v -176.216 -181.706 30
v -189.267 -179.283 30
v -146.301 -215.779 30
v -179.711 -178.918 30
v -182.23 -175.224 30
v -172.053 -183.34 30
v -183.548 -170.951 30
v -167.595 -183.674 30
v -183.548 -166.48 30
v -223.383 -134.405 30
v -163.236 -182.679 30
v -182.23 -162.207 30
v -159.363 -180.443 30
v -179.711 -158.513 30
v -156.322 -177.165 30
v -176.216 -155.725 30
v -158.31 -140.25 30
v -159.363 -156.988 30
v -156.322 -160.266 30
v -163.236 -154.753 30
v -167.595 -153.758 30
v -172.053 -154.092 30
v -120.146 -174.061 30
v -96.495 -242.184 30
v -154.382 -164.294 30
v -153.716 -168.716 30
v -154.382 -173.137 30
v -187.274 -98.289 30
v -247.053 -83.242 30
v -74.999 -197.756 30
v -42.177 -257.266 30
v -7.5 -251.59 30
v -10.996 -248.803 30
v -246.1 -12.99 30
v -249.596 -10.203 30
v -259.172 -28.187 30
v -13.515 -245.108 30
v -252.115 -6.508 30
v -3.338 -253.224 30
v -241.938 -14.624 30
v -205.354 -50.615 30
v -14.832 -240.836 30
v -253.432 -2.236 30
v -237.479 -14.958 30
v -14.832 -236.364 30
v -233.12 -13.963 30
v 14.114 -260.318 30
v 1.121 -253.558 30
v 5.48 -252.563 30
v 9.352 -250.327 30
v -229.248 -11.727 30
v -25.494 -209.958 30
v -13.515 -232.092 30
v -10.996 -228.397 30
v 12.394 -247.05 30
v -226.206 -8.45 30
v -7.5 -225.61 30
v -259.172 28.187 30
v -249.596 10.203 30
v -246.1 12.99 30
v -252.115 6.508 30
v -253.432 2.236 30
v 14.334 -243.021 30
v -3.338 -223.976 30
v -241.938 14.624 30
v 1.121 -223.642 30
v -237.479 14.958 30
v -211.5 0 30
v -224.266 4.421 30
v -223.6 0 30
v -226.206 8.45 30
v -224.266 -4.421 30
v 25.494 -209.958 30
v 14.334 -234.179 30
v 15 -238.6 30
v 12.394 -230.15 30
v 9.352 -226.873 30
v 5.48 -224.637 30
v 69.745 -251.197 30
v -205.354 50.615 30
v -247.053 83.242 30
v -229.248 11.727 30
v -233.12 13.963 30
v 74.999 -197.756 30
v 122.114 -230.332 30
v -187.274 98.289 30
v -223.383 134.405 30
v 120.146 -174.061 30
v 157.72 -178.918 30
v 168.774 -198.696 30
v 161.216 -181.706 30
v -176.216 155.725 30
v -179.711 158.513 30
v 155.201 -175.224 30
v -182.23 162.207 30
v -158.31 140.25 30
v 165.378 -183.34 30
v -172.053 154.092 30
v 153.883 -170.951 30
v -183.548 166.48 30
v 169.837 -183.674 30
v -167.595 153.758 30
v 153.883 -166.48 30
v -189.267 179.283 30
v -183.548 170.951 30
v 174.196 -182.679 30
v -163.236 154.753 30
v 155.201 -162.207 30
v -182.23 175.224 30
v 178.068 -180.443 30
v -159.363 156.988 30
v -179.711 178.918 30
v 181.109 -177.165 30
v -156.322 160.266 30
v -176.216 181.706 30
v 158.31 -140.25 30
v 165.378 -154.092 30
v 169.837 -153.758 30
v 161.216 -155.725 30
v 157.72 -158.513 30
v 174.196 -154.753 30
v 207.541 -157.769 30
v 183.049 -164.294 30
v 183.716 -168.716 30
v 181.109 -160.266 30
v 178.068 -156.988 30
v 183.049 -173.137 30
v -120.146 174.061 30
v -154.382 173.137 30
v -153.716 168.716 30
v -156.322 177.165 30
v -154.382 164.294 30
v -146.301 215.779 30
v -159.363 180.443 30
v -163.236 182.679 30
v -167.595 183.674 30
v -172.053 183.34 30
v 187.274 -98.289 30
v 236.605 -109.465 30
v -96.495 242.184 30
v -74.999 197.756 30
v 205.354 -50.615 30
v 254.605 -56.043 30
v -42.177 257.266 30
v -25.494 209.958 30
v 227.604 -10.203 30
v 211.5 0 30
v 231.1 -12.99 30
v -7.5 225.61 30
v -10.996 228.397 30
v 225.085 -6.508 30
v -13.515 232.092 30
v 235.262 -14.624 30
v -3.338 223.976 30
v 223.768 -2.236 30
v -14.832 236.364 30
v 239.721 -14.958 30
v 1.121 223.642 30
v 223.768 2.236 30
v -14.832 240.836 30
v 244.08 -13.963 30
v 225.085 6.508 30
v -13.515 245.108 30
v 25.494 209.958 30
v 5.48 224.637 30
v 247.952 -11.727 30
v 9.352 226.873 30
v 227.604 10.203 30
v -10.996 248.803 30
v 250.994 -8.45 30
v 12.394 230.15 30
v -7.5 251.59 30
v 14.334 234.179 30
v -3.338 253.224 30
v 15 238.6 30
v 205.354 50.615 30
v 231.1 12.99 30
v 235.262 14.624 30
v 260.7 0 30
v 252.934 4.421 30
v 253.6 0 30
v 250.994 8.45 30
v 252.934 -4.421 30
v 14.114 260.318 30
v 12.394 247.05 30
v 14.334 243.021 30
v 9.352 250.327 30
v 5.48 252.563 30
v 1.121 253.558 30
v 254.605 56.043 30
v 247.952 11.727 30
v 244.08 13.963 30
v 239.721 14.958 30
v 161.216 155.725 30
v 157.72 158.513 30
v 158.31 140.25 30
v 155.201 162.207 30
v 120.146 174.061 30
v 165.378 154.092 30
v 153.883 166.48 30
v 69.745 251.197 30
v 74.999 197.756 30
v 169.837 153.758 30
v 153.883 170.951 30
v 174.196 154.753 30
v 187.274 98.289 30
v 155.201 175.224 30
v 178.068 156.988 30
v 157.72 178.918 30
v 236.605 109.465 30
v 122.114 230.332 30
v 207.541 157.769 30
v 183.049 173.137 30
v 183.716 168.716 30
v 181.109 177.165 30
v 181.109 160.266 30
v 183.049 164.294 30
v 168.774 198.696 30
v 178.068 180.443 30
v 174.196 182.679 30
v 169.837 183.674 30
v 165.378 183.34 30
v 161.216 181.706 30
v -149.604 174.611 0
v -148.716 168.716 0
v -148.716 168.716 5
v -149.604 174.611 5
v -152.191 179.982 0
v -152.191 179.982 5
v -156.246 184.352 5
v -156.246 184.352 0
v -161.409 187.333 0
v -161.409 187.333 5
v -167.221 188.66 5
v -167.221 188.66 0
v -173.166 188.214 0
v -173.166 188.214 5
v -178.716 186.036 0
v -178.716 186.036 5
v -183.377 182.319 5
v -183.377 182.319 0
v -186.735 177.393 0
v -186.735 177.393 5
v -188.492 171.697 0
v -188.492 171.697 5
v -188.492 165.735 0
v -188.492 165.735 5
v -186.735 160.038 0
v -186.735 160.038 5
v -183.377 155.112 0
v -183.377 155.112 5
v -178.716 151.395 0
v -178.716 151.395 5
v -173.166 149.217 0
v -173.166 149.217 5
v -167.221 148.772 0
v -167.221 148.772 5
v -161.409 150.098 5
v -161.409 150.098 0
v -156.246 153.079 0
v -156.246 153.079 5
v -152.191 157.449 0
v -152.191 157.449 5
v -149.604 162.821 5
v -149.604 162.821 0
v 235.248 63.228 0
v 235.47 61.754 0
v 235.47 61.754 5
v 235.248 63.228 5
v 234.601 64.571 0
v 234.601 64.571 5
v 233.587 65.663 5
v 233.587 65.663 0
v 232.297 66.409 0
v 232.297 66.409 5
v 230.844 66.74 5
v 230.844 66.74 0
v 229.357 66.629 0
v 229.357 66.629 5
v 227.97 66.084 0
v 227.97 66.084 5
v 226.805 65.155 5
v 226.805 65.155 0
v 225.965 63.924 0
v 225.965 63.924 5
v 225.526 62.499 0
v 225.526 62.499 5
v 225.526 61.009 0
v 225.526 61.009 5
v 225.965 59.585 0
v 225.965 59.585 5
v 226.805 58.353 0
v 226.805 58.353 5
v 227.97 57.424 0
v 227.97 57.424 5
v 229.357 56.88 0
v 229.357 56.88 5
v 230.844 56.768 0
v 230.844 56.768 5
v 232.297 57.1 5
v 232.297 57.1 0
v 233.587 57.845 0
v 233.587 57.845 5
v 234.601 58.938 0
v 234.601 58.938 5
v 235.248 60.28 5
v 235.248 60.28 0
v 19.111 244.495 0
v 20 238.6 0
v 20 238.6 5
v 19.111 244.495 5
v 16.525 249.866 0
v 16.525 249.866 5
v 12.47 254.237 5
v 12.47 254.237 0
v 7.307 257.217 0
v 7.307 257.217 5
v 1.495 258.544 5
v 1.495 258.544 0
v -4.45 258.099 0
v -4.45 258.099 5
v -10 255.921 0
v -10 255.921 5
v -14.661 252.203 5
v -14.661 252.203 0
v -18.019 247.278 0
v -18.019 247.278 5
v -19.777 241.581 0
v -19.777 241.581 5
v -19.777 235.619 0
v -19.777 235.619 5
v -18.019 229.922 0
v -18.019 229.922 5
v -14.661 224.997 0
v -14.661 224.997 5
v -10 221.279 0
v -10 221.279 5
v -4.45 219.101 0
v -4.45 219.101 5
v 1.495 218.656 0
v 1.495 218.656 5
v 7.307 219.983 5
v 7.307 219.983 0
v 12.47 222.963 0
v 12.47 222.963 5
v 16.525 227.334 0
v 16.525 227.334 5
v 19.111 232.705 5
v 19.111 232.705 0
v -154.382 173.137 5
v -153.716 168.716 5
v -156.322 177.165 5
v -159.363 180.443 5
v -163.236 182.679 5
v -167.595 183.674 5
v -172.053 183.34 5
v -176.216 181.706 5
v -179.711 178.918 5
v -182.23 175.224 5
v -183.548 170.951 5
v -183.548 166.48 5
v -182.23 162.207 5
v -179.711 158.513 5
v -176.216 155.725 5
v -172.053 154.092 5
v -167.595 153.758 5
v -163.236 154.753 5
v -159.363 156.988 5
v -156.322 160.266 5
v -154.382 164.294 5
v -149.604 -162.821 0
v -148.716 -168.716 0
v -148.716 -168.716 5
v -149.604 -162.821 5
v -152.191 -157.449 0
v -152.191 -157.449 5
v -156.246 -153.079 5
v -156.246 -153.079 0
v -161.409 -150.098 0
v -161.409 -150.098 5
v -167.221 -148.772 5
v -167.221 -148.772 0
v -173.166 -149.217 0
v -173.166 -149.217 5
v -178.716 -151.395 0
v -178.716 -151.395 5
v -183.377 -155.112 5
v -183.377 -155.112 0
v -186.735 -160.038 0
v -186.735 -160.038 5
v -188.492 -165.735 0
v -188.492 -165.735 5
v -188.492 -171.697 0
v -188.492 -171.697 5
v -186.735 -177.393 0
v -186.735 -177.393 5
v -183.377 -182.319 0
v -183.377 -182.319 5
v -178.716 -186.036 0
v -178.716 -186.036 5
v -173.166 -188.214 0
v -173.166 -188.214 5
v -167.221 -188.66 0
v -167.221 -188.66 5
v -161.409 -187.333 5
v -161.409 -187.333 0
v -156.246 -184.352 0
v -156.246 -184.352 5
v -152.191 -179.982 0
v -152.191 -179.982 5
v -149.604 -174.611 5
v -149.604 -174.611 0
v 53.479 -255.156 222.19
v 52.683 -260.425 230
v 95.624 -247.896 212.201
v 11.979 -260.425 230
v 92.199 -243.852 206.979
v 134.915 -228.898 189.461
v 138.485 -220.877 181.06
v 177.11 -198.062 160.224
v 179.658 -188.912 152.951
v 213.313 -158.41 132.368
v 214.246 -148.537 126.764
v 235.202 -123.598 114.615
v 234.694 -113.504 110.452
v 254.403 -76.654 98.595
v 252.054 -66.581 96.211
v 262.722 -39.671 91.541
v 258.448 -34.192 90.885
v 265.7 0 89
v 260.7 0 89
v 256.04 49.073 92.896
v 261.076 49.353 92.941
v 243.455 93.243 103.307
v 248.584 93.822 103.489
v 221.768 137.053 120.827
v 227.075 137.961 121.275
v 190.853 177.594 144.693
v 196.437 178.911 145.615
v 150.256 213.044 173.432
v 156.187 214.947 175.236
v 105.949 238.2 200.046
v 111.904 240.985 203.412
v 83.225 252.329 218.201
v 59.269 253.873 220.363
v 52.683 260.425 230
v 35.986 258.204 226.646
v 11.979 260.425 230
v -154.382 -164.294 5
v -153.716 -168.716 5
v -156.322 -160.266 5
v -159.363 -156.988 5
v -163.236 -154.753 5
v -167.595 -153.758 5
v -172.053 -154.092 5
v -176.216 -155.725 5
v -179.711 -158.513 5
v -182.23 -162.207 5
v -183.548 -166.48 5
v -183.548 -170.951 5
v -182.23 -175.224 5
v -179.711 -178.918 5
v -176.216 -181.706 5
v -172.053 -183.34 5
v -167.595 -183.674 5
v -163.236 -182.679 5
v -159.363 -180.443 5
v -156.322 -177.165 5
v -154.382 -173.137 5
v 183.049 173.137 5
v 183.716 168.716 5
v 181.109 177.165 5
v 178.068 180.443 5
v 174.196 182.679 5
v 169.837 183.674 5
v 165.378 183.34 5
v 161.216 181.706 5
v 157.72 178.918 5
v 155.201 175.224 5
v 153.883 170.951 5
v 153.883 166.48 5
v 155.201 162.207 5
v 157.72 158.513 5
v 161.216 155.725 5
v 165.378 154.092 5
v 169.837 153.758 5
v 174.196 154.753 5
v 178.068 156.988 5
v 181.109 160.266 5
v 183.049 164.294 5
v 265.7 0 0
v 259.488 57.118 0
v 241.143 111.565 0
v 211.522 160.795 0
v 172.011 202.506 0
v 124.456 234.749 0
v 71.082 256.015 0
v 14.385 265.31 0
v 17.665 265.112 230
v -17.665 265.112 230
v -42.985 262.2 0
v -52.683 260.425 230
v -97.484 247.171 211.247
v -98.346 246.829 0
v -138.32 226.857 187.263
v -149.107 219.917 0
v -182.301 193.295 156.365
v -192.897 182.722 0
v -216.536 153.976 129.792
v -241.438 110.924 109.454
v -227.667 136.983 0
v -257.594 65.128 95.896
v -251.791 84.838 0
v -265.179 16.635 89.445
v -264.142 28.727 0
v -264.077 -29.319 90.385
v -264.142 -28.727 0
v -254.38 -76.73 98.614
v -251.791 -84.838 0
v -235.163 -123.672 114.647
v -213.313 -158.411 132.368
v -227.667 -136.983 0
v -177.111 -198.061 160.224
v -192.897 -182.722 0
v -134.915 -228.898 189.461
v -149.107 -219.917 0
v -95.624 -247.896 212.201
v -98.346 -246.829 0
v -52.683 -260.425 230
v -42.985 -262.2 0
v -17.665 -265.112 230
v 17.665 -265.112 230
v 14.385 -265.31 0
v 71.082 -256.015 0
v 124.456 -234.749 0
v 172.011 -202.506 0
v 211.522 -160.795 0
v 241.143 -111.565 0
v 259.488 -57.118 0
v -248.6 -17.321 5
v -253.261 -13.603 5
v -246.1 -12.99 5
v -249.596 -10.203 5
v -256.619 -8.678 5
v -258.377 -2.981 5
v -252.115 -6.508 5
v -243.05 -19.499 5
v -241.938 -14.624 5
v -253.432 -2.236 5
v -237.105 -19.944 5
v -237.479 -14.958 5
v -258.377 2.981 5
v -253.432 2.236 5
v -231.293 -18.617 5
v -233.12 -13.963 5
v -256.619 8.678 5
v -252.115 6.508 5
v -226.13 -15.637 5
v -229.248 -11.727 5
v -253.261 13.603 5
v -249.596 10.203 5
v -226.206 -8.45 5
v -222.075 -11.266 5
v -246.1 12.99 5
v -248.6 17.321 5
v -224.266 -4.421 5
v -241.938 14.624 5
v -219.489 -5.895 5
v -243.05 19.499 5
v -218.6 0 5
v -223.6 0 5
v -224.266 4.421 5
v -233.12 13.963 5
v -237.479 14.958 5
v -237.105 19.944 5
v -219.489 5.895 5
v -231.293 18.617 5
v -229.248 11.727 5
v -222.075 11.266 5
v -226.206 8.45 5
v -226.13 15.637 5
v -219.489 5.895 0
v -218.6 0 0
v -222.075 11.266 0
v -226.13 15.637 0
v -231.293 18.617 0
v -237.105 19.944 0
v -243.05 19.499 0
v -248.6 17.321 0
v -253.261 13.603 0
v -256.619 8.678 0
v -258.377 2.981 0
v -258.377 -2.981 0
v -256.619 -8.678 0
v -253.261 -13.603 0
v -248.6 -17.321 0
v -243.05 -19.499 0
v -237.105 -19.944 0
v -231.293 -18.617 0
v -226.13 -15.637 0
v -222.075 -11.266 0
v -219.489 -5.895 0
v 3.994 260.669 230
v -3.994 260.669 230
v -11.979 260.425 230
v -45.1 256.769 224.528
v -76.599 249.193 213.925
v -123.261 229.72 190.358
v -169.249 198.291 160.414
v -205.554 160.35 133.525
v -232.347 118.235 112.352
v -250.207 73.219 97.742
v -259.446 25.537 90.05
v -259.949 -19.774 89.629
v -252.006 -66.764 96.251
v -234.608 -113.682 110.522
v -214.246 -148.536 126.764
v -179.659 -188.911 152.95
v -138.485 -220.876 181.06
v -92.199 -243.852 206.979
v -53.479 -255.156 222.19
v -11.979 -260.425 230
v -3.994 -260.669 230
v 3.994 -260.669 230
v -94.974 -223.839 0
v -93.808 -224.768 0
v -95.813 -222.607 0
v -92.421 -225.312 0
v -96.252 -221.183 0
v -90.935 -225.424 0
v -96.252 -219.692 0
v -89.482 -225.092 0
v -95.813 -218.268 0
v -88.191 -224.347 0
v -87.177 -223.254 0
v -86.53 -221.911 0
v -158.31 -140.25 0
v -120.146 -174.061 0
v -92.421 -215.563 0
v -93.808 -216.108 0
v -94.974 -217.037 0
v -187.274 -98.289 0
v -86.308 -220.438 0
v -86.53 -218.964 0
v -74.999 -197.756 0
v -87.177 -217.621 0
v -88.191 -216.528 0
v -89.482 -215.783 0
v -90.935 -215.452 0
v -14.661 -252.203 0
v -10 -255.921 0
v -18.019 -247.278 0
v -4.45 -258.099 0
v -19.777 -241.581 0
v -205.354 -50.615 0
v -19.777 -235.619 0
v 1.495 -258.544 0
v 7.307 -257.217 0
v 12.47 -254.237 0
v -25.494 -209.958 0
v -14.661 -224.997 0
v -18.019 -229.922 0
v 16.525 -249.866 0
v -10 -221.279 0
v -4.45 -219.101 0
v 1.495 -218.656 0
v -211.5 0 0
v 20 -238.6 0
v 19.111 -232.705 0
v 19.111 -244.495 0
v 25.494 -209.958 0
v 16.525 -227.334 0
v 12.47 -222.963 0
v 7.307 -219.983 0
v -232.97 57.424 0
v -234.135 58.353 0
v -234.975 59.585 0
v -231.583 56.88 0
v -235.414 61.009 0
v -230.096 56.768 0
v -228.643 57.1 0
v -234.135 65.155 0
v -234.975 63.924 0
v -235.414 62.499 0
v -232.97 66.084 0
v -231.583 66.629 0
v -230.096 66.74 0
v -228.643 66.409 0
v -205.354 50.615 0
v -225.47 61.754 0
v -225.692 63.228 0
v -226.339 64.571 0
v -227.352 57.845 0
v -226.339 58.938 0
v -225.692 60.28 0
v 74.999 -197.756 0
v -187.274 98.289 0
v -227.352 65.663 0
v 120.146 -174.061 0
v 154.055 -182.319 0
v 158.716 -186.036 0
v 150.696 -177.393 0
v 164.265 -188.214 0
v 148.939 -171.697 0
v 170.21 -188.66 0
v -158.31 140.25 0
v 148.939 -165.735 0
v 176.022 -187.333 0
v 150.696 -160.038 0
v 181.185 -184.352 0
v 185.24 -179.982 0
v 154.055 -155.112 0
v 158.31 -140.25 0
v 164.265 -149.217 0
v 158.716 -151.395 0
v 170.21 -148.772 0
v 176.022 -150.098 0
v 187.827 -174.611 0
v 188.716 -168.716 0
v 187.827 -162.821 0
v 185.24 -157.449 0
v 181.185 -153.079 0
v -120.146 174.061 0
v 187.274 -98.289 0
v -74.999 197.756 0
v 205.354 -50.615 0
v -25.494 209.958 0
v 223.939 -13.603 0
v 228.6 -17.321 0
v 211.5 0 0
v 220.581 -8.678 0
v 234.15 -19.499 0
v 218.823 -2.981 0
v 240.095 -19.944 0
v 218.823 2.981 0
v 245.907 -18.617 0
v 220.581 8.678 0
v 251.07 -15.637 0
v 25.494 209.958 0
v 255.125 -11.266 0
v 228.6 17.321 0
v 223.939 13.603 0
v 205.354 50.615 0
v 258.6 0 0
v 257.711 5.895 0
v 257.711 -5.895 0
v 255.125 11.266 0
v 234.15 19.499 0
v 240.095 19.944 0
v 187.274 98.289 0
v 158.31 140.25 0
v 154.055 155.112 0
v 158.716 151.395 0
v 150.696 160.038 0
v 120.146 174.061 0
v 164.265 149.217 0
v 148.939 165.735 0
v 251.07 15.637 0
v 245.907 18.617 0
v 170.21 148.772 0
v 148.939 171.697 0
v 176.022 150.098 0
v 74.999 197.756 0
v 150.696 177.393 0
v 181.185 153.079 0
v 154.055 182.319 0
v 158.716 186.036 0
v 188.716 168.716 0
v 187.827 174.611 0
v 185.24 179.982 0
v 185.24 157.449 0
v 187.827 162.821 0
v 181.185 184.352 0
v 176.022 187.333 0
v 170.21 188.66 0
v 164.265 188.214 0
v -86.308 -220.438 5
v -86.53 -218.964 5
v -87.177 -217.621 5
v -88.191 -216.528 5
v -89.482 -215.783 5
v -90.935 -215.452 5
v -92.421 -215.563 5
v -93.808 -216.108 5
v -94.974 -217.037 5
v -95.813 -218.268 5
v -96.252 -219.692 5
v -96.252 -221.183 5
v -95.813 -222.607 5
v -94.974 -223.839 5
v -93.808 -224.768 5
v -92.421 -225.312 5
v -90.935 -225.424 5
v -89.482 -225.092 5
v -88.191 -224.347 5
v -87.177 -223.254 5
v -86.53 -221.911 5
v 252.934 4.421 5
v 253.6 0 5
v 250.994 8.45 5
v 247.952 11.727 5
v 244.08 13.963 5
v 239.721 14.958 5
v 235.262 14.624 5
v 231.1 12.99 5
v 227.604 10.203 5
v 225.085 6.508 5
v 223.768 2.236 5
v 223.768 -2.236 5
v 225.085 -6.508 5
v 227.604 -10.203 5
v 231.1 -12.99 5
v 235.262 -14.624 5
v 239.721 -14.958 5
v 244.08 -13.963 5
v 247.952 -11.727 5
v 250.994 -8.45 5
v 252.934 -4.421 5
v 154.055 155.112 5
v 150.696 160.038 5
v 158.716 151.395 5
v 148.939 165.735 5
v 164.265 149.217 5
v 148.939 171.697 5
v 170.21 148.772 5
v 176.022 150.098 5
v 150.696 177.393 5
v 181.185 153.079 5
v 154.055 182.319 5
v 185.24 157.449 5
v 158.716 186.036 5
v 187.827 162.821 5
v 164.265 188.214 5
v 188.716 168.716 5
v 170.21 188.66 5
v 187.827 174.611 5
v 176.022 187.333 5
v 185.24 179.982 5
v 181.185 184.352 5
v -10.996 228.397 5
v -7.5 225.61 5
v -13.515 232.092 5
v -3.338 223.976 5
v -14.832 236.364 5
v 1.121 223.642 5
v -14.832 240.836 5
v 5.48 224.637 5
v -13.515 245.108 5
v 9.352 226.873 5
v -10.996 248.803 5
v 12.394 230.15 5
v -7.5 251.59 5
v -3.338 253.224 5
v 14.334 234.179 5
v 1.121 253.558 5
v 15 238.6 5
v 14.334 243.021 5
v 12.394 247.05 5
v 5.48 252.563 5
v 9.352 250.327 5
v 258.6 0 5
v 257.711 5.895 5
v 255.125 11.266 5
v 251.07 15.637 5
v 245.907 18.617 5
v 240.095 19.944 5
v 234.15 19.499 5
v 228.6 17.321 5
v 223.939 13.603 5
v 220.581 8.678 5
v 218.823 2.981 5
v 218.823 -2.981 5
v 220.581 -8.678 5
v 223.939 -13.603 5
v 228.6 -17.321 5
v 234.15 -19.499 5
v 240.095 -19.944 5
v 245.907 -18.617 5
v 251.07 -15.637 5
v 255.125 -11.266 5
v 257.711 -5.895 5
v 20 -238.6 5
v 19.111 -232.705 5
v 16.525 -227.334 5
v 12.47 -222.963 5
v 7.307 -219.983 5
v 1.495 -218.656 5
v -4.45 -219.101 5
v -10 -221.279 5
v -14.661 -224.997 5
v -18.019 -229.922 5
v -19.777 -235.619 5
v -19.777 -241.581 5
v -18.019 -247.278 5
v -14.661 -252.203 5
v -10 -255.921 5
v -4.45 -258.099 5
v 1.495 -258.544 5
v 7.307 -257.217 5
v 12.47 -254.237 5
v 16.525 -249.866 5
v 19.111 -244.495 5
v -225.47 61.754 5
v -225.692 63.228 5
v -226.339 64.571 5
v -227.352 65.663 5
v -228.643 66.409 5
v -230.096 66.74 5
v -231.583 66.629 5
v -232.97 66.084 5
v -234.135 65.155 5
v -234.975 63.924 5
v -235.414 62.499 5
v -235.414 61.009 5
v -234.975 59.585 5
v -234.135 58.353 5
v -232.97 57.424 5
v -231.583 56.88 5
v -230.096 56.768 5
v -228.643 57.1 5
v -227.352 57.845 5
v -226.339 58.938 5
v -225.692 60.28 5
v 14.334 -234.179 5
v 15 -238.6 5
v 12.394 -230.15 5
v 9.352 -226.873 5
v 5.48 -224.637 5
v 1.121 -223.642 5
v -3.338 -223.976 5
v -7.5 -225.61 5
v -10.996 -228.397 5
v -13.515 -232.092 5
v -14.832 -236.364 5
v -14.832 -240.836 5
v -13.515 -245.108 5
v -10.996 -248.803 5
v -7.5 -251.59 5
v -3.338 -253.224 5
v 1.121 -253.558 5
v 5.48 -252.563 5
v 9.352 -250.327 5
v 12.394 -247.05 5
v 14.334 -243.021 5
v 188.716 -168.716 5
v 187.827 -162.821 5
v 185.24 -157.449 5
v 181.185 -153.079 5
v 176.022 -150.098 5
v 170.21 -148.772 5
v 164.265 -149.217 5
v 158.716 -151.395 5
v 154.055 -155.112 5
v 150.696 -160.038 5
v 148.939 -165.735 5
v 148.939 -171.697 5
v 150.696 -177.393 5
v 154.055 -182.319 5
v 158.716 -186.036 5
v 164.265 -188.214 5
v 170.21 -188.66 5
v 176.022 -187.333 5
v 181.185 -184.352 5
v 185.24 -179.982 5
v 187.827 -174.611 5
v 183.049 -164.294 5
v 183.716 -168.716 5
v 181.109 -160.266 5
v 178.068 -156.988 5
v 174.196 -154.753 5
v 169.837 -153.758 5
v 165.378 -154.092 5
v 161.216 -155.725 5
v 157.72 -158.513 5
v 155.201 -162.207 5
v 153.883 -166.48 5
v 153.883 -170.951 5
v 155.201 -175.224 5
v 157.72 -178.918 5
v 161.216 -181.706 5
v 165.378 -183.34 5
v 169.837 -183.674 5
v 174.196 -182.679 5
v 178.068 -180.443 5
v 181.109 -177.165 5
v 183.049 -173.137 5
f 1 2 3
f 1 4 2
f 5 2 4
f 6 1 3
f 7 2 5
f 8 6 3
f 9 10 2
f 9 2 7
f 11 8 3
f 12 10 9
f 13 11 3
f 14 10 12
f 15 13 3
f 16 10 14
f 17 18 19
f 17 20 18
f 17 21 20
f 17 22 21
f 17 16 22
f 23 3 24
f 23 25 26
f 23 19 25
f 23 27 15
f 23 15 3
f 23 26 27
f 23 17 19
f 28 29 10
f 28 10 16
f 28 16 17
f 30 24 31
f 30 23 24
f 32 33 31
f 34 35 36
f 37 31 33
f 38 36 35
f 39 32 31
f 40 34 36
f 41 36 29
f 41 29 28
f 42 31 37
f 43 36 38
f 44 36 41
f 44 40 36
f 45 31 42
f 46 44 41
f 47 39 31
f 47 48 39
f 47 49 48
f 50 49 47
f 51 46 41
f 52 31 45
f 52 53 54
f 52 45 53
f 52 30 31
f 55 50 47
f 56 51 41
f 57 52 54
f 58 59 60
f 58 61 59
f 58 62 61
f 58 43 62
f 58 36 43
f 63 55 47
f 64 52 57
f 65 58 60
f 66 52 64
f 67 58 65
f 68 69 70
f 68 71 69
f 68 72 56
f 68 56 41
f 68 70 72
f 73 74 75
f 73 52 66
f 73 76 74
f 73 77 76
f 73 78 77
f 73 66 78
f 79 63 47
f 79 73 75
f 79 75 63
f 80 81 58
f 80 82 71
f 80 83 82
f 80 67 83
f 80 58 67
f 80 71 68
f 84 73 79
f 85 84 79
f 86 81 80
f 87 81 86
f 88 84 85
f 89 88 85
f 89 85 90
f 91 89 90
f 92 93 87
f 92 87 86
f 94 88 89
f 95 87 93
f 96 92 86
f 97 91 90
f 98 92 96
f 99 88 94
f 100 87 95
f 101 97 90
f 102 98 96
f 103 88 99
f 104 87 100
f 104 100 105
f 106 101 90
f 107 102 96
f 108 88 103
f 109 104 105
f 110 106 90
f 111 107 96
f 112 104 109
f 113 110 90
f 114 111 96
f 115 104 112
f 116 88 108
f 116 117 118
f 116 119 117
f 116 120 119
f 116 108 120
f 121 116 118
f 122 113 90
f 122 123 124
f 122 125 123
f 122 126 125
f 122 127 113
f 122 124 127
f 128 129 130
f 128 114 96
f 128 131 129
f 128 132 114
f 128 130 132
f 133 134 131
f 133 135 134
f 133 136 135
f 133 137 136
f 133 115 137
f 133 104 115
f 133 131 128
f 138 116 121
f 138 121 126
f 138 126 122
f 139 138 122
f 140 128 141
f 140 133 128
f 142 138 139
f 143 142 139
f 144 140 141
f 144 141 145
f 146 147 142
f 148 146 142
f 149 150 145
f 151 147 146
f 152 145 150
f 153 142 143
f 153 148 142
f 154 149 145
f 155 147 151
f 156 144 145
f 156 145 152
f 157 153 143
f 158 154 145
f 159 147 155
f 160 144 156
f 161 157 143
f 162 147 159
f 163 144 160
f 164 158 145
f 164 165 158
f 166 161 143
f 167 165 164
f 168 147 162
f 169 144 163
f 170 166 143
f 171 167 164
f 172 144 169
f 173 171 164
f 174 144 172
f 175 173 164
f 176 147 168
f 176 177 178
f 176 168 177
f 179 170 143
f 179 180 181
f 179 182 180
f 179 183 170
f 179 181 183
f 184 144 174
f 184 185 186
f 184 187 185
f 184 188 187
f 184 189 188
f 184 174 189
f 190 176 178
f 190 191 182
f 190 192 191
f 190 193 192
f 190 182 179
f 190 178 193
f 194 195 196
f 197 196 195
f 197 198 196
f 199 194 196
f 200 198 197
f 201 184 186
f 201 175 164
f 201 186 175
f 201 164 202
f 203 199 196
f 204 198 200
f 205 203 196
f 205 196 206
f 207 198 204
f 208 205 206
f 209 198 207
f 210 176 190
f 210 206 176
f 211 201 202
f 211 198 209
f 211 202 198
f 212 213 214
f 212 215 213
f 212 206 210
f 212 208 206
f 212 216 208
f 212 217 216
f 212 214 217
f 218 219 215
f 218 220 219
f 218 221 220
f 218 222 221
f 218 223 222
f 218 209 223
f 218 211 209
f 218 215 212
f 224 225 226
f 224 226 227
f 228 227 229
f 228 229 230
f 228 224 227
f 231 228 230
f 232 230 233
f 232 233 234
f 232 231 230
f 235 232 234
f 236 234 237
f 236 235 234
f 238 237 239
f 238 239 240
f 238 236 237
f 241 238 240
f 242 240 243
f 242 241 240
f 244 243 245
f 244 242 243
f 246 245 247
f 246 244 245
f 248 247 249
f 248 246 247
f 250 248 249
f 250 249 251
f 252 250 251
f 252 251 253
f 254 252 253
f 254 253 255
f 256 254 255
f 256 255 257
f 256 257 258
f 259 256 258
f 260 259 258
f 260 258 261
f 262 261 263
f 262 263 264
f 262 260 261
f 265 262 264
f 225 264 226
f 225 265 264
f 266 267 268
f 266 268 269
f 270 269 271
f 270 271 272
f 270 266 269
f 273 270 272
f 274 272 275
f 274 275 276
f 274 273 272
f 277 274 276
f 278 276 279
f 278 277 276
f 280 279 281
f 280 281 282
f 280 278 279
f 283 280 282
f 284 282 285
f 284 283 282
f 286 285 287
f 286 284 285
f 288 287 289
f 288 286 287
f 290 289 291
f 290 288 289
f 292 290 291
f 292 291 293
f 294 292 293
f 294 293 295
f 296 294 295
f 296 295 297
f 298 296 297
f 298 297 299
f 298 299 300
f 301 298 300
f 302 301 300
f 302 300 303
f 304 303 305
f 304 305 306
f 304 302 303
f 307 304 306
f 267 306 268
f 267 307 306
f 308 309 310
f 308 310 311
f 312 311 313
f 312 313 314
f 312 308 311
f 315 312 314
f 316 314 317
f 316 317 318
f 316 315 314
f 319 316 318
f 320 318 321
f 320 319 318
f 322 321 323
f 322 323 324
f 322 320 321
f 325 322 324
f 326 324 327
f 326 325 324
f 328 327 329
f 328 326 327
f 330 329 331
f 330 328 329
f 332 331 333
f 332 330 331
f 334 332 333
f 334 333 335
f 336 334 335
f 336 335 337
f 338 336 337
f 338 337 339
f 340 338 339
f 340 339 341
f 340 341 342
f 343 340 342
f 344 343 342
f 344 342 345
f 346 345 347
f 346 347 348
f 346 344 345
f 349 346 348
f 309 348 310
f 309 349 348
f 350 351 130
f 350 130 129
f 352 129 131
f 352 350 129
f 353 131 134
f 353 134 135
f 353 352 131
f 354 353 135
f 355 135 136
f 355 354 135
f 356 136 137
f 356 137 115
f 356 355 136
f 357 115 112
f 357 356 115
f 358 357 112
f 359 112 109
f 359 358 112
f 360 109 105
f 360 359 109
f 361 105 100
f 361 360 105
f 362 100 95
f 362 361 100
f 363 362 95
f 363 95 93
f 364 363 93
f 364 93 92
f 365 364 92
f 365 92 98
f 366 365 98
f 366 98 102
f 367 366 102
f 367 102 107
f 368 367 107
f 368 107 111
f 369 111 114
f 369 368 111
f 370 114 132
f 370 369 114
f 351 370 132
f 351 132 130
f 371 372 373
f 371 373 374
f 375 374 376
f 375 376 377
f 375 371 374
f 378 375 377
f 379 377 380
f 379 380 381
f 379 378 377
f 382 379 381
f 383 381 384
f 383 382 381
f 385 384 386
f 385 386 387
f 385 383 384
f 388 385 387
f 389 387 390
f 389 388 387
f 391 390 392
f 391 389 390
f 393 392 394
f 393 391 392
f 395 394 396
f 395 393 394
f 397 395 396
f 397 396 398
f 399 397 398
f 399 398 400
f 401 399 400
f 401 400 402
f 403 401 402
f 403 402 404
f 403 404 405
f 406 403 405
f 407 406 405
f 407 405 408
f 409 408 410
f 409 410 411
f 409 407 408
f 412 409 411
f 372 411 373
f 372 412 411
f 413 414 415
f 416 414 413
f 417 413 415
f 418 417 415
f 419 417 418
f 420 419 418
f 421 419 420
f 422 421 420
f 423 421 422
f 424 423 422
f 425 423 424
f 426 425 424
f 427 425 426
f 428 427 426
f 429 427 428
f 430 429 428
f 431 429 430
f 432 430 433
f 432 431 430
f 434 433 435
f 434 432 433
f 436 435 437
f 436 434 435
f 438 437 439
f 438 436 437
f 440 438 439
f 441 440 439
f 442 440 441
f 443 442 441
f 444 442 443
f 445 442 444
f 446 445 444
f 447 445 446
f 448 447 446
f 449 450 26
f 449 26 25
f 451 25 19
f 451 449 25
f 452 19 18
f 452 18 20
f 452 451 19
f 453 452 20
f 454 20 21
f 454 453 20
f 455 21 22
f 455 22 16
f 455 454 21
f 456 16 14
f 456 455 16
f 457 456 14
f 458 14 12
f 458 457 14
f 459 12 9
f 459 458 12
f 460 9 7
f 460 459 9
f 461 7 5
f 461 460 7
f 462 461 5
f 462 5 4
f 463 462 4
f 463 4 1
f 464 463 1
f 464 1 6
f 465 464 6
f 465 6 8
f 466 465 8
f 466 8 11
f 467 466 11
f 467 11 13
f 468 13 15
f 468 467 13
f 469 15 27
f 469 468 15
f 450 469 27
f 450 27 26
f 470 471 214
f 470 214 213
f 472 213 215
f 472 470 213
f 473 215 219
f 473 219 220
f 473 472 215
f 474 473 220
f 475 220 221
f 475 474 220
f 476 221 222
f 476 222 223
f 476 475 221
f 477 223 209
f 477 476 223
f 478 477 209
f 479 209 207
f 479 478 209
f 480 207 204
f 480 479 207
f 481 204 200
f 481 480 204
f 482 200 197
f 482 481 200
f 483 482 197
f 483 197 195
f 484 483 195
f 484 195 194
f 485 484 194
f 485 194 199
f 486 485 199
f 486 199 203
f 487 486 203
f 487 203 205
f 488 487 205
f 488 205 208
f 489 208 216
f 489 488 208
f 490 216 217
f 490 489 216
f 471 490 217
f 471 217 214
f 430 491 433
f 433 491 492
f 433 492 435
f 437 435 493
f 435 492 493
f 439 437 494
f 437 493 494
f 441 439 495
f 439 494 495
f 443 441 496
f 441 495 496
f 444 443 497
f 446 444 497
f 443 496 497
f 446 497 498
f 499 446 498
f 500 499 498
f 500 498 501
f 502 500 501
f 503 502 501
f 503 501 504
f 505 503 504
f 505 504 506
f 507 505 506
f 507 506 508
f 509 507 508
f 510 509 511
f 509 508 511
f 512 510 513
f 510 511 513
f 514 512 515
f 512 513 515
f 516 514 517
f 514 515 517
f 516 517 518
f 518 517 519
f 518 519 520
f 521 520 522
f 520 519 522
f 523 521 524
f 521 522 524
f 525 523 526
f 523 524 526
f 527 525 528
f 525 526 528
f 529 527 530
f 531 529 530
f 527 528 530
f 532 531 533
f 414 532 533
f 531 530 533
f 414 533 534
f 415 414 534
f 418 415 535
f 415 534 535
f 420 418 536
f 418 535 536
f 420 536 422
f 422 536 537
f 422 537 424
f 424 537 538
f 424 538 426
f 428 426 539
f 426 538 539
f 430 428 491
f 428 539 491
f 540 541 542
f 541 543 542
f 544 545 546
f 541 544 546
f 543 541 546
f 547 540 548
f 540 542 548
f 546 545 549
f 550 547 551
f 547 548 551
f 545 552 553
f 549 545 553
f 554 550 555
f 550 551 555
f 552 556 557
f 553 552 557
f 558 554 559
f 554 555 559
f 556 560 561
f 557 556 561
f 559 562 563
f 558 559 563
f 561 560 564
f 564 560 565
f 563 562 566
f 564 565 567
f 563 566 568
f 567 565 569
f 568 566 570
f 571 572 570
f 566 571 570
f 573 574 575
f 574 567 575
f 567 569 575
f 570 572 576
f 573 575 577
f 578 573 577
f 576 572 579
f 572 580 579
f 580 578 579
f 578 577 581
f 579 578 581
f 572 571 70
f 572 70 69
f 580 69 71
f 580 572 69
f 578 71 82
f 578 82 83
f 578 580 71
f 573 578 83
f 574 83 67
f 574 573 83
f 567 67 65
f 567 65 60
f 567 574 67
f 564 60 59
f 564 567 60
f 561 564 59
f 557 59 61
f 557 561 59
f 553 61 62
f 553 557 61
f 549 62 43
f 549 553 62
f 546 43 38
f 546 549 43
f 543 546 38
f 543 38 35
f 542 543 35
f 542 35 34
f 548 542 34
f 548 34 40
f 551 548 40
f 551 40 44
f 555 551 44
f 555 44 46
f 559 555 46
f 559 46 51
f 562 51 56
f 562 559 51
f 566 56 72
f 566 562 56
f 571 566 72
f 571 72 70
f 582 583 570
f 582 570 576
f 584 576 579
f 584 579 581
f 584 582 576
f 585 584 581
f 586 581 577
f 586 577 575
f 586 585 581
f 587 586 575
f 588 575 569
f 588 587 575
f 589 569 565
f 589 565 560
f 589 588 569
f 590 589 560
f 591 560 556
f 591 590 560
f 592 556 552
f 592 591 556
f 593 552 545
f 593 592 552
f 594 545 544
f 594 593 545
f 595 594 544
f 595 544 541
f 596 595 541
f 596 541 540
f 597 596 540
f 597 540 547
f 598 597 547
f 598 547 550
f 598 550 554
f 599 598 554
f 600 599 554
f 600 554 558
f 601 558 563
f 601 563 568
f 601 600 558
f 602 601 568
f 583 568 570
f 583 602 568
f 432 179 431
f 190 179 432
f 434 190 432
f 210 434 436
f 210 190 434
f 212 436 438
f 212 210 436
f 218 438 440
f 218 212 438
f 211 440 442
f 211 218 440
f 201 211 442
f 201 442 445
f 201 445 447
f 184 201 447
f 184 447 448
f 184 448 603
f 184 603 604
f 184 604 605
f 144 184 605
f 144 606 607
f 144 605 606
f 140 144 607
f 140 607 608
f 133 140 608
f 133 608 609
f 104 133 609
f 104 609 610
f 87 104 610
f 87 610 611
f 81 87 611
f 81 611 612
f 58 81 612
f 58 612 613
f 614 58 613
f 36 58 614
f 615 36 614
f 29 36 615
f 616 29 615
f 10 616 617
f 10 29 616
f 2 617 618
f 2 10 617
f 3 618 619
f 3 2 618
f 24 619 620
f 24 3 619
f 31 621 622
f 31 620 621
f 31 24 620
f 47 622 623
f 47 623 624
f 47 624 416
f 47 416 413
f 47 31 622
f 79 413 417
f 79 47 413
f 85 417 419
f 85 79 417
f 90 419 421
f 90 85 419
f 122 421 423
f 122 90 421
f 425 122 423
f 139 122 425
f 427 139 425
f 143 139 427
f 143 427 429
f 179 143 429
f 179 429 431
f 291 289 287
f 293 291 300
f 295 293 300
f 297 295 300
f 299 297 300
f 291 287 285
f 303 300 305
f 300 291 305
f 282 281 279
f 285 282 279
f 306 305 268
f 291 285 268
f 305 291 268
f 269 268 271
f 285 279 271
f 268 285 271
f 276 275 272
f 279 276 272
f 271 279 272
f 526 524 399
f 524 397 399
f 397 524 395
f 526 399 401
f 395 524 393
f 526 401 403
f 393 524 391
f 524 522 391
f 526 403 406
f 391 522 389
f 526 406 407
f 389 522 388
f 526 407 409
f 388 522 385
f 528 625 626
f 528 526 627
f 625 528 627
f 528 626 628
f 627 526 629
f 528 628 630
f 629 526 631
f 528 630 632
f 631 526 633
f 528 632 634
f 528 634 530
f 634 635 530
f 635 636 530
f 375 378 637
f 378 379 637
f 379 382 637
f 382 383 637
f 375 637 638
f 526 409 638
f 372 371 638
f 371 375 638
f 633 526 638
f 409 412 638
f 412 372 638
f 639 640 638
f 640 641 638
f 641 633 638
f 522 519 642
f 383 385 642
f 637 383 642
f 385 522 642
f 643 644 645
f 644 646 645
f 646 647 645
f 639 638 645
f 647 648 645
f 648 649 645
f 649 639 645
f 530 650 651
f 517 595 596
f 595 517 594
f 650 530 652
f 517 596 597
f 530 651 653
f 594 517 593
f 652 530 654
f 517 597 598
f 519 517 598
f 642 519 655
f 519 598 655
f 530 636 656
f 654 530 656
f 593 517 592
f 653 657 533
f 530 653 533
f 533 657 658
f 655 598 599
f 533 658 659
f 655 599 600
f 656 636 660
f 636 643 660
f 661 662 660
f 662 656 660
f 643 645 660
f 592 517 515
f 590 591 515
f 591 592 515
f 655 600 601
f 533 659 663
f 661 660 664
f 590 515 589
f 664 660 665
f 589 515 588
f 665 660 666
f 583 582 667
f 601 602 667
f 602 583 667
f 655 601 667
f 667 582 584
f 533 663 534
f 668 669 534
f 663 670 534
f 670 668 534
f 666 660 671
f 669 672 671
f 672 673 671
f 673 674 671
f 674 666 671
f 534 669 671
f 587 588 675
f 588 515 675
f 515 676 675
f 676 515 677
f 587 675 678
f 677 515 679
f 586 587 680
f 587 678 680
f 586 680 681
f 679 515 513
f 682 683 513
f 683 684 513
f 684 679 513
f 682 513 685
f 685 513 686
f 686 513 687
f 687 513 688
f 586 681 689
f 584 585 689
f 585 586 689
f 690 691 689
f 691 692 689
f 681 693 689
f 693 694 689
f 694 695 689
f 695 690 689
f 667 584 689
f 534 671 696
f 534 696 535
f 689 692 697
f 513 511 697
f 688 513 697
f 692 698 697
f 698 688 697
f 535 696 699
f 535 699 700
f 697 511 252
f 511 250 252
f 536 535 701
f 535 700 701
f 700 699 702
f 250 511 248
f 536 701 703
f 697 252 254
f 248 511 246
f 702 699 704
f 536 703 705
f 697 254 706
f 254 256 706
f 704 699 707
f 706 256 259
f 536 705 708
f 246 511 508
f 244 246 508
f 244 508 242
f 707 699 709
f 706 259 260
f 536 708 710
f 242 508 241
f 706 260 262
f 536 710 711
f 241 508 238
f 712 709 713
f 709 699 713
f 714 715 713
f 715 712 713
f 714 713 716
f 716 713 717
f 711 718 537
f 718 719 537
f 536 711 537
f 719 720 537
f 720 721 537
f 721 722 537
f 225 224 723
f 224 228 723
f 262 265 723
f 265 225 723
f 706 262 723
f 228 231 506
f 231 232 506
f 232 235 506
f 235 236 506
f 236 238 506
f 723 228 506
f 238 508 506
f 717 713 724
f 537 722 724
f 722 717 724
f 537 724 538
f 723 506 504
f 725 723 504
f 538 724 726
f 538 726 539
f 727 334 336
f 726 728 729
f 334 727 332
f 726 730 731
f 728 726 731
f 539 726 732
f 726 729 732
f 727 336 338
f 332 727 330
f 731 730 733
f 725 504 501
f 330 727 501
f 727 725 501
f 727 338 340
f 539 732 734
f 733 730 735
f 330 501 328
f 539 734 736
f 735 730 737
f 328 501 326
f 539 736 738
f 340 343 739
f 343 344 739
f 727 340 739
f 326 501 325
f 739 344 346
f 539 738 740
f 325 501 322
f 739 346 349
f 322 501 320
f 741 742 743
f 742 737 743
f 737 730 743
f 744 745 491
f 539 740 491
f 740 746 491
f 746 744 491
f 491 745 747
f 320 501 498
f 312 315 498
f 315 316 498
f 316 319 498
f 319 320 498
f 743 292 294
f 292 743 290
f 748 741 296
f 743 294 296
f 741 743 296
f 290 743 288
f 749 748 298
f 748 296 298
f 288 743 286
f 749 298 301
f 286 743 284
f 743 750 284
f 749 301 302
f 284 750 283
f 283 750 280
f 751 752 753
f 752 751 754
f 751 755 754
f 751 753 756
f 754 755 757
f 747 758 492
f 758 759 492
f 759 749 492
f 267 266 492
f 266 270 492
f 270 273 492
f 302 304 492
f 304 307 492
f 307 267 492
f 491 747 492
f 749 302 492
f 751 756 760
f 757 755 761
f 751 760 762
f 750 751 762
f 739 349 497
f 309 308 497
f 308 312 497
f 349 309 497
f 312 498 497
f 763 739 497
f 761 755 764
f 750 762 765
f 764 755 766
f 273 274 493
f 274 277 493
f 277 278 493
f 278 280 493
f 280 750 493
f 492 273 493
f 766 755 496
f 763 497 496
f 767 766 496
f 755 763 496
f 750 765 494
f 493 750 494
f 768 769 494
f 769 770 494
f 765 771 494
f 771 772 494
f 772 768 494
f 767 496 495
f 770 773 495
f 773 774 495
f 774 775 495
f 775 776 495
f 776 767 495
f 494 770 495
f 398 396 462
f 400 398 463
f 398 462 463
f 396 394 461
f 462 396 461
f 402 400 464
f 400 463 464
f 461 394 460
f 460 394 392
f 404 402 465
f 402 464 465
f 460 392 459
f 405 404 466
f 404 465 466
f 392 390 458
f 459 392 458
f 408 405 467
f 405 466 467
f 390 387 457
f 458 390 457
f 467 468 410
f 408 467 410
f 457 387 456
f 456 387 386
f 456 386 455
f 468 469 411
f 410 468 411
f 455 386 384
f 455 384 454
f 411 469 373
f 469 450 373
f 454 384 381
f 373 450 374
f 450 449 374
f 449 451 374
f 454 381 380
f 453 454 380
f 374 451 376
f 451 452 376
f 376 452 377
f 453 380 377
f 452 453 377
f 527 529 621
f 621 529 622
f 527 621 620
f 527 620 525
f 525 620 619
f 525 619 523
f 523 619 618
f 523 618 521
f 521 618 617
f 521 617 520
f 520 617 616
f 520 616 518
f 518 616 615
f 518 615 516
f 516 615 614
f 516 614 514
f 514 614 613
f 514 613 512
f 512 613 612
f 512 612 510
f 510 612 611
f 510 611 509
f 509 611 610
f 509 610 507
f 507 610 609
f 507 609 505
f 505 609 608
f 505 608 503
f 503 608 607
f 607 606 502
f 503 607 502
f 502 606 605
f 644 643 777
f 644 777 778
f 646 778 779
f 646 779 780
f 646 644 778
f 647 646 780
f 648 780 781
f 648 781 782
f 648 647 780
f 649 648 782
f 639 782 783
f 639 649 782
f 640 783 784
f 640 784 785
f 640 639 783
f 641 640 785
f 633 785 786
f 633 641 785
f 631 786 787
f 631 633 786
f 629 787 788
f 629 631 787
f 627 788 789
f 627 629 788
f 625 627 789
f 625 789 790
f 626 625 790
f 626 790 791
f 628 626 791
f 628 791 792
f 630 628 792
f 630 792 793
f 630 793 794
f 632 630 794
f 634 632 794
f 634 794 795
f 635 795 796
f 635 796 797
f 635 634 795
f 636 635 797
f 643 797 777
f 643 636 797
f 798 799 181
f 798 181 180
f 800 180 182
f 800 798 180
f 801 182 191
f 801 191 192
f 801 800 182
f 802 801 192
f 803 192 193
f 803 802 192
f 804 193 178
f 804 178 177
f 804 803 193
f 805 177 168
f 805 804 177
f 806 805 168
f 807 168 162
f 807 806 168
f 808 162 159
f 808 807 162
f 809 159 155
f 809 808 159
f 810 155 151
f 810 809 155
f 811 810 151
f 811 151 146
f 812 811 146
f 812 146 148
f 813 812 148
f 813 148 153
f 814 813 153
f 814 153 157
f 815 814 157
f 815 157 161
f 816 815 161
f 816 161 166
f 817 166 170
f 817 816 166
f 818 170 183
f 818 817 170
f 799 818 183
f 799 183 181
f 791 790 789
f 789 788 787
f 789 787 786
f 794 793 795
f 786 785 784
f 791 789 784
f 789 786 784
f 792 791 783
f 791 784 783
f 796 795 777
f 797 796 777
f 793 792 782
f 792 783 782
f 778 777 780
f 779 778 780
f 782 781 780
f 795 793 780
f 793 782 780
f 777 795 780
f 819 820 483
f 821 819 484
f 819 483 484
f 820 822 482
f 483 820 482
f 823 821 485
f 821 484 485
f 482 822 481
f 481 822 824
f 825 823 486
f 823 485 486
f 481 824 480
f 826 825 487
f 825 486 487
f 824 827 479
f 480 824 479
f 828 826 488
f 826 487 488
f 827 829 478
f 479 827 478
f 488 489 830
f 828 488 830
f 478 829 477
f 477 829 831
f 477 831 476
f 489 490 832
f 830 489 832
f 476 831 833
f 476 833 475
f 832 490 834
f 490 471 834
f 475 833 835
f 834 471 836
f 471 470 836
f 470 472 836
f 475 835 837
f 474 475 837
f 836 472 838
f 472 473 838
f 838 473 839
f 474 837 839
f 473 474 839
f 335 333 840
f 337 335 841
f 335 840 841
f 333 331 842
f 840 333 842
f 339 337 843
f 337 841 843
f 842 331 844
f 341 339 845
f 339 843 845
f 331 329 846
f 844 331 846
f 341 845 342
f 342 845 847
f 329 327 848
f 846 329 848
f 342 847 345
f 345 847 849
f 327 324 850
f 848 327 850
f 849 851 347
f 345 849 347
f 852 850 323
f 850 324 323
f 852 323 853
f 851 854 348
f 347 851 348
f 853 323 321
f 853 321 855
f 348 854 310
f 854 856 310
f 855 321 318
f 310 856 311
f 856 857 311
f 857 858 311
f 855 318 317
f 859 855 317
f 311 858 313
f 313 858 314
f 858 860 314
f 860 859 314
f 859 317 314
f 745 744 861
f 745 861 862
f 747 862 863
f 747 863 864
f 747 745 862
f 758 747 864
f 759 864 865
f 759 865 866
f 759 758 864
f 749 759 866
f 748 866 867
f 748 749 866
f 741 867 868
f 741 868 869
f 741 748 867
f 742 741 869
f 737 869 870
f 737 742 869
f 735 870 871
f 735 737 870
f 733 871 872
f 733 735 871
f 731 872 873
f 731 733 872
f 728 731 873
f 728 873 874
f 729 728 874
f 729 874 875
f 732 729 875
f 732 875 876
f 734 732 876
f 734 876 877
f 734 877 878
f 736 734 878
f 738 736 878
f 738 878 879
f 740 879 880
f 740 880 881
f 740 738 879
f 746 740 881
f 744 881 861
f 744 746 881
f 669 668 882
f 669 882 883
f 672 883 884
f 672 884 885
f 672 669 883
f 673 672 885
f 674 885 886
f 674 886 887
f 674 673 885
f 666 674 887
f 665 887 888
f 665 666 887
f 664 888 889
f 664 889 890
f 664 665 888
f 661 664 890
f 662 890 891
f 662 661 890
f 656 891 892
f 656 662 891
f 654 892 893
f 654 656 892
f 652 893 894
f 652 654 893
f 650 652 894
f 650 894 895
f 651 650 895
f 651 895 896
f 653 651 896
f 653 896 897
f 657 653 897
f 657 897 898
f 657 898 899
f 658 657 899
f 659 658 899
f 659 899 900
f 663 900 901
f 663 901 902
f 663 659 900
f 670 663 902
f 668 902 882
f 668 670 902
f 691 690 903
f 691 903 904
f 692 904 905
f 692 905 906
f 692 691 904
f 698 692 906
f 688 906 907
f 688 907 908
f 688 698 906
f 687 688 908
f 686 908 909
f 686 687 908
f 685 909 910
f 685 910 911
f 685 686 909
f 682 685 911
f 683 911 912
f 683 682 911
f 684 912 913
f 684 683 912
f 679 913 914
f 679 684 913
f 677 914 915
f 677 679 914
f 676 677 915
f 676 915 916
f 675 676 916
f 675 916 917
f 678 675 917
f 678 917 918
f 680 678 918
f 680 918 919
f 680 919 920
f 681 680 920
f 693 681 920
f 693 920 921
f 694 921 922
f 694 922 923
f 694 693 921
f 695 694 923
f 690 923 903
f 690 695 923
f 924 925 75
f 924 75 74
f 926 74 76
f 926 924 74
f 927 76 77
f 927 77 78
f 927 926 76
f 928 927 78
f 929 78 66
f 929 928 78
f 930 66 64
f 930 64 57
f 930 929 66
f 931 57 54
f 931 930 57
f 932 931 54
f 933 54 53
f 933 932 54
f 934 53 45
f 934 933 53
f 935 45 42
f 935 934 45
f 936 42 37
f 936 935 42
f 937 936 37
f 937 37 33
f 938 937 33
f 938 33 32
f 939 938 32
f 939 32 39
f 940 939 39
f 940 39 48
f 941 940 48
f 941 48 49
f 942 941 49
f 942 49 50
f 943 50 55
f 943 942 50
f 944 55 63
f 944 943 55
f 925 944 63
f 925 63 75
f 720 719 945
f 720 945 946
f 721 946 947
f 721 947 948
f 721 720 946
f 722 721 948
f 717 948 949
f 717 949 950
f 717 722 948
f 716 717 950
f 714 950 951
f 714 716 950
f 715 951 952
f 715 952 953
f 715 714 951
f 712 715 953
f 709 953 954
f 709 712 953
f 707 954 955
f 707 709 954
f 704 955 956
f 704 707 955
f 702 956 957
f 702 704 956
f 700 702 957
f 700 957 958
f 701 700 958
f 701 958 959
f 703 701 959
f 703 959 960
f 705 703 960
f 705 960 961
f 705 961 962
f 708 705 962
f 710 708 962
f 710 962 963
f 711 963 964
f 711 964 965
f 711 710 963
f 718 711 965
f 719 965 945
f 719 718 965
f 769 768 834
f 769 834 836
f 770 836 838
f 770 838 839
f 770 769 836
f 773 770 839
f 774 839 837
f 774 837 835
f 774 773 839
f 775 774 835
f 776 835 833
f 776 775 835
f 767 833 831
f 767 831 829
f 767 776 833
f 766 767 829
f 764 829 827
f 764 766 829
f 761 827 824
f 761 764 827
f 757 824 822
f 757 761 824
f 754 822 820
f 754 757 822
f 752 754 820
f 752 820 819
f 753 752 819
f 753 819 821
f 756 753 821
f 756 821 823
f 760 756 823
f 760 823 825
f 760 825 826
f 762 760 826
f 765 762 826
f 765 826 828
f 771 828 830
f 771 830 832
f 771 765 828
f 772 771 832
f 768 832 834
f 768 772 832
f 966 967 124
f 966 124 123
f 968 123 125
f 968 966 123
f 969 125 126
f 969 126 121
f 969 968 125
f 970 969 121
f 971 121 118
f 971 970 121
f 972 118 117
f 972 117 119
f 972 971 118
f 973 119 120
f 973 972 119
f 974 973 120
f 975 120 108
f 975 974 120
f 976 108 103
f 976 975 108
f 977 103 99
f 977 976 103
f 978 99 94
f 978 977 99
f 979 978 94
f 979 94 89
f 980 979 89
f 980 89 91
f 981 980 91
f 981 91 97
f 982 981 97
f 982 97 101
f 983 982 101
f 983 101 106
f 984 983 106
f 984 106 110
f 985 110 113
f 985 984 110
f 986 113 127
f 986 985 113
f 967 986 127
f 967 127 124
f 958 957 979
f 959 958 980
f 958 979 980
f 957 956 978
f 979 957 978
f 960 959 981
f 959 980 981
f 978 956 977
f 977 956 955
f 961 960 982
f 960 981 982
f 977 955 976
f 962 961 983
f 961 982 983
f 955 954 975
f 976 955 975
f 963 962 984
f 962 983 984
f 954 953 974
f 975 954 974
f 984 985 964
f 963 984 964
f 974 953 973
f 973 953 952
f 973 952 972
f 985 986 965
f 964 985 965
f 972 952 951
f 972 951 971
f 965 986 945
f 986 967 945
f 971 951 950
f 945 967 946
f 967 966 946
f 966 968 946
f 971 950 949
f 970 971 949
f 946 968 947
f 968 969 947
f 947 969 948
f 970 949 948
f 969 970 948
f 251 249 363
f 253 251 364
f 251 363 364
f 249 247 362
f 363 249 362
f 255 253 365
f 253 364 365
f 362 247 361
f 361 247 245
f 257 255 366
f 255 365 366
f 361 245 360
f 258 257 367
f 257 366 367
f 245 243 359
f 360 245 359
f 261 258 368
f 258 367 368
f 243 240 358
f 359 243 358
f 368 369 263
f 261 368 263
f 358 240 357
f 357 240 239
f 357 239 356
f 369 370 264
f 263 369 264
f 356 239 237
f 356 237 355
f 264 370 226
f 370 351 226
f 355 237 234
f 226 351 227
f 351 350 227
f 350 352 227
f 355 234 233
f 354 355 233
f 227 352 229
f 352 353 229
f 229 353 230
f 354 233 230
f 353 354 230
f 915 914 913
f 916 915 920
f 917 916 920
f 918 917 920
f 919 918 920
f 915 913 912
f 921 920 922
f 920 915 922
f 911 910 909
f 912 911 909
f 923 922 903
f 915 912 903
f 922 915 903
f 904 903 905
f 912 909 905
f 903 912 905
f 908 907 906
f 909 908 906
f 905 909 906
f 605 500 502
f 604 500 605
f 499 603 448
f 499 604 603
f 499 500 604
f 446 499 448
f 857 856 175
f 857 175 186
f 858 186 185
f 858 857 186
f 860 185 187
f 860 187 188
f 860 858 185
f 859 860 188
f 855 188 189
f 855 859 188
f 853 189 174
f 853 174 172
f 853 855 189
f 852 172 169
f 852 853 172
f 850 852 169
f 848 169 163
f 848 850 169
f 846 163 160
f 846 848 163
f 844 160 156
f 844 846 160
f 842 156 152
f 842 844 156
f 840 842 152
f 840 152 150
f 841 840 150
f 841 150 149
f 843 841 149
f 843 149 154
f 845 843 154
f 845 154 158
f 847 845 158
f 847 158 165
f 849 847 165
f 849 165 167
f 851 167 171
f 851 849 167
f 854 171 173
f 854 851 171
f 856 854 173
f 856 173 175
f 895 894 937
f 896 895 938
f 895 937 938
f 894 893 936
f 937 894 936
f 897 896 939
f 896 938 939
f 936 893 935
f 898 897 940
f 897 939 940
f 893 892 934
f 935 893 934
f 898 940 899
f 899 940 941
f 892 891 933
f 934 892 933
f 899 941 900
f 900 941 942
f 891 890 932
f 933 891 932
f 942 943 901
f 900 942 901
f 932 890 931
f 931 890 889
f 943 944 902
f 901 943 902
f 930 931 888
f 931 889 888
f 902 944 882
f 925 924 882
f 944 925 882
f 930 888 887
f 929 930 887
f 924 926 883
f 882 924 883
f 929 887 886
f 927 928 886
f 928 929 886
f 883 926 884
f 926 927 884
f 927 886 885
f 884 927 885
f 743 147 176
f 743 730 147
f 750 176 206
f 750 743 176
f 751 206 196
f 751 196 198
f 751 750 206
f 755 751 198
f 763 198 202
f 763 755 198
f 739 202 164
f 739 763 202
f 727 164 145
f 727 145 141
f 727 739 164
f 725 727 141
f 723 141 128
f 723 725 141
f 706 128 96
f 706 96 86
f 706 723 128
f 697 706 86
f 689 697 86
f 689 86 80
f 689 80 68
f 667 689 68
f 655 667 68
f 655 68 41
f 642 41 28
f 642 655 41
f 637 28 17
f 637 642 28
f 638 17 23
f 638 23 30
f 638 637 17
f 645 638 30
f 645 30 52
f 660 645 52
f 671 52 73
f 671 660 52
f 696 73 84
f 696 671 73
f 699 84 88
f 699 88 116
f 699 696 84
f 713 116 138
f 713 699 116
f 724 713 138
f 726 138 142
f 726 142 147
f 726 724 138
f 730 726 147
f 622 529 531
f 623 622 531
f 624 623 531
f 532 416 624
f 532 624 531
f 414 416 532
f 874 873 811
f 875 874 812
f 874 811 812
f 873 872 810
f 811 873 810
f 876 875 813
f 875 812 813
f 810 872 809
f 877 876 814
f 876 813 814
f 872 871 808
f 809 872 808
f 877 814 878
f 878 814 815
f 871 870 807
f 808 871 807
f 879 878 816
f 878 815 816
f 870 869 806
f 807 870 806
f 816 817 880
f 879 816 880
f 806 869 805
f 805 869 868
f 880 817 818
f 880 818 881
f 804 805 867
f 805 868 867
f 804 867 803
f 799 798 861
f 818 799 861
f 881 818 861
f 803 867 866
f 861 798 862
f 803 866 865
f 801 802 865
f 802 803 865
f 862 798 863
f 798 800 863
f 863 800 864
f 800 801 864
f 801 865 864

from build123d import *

# Parameters (mm, degrees)
SKETCH1_R           = 265.7
SKETCH1_R_2         = 211.5
SKETCH1_R_3         = 20
SKETCH1_R_4         = 5
EXTRUDE1_DEPTH      = 5
SKETCH2_R           = 265.7
SKETCH2_R_2         = 15
SKETCH2_R_3         = 211.5
EXTRUDE2_DEPTH      = 25
SKETCH3_R           = 265.7
SKETCH3_R_2         = 260.7
EXTRUDE3_DEPTH      = 200
SKETCH4_R           = 311
EXTRUDE4_DEPTH      = 266.7
EXTRUDE4_DEPTH_BACK = 266.7


with BuildPart() as part:
    # Sketch1 → Extrude1 (new body)
    with BuildSketch(Plane.XY):
        Circle(SKETCH1_R)
        Circle(SKETCH1_R_2, mode=Mode.SUBTRACT)
        with Locations((238.6, 0)):
            Circle(SKETCH1_R_3, mode=Mode.SUBTRACT)
        with Locations((168.715677991, 168.715677991)):
            Circle(SKETCH1_R_3, mode=Mode.SUBTRACT)
        with Locations((0, 238.6)):
            Circle(SKETCH1_R_3, mode=Mode.SUBTRACT)
        with Locations((-168.715677991, 168.715677991)):
            Circle(SKETCH1_R_3, mode=Mode.SUBTRACT)
        with Locations((-238.6, 0)):
            Circle(SKETCH1_R_3, mode=Mode.SUBTRACT)
        with Locations((-168.715677991, -168.715677991)):
            Circle(SKETCH1_R_3, mode=Mode.SUBTRACT)
        with Locations((0, -238.6)):
            Circle(SKETCH1_R_3, mode=Mode.SUBTRACT)
        with Locations((168.715677991, -168.715677991)):
            Circle(SKETCH1_R_3, mode=Mode.SUBTRACT)
        with Locations((230.469902153, 61.754224161)):
            Circle(SKETCH1_R_4, mode=Mode.SUBTRACT)
        with Locations((-230.469902153, 61.754224161)):
            Circle(SKETCH1_R_4, mode=Mode.SUBTRACT)
        with Locations((-91.308266962, -220.437656457)):
            Circle(SKETCH1_R_4, mode=Mode.SUBTRACT)
    extrude(amount=EXTRUDE1_DEPTH)

    # Sketch2 → Extrude2 (add)
    with BuildSketch(Plane.XY.offset(5)):
        Circle(SKETCH2_R)
        with Locations((238.6, 0)):
            Circle(SKETCH2_R_2, mode=Mode.SUBTRACT)
        with Locations((168.715677991, 168.715677991)):
            Circle(SKETCH2_R_2, mode=Mode.SUBTRACT)
        with Locations((0, 238.6)):
            Circle(SKETCH2_R_2, mode=Mode.SUBTRACT)
        with Locations((-168.715677991, 168.715677991)):
            Circle(SKETCH2_R_2, mode=Mode.SUBTRACT)
        with Locations((-238.6, 0)):
            Circle(SKETCH2_R_2, mode=Mode.SUBTRACT)
        with Locations((-168.715677991, -168.715677991)):
            Circle(SKETCH2_R_2, mode=Mode.SUBTRACT)
        with Locations((0, -238.6)):
            Circle(SKETCH2_R_2, mode=Mode.SUBTRACT)
        with Locations((168.715677991, -168.715677991)):
            Circle(SKETCH2_R_2, mode=Mode.SUBTRACT)
        Circle(SKETCH2_R_3, mode=Mode.SUBTRACT)
    extrude(amount=EXTRUDE2_DEPTH)

    # Sketch3 → Extrude3 (add)
    with BuildSketch(Plane.XY.offset(30)):
        Circle(SKETCH3_R)
        Circle(SKETCH3_R_2, mode=Mode.SUBTRACT)
    extrude(amount=EXTRUDE3_DEPTH)

    # Sketch4 → Extrude4 (cut, two sides)
    with BuildSketch(Plane(origin=(0, 0, 0), x_dir=(0, 0, -1), z_dir=(1, 0, 0))) as extrude4_sk:
        with Locations((-400, 0)):
            Circle(SKETCH4_R)
    extrude(amount=EXTRUDE4_DEPTH, mode=Mode.SUBTRACT)
    extrude(extrude4_sk.sketch, amount=-EXTRUDE4_DEPTH_BACK, mode=Mode.SUBTRACT)


solid = part.part
